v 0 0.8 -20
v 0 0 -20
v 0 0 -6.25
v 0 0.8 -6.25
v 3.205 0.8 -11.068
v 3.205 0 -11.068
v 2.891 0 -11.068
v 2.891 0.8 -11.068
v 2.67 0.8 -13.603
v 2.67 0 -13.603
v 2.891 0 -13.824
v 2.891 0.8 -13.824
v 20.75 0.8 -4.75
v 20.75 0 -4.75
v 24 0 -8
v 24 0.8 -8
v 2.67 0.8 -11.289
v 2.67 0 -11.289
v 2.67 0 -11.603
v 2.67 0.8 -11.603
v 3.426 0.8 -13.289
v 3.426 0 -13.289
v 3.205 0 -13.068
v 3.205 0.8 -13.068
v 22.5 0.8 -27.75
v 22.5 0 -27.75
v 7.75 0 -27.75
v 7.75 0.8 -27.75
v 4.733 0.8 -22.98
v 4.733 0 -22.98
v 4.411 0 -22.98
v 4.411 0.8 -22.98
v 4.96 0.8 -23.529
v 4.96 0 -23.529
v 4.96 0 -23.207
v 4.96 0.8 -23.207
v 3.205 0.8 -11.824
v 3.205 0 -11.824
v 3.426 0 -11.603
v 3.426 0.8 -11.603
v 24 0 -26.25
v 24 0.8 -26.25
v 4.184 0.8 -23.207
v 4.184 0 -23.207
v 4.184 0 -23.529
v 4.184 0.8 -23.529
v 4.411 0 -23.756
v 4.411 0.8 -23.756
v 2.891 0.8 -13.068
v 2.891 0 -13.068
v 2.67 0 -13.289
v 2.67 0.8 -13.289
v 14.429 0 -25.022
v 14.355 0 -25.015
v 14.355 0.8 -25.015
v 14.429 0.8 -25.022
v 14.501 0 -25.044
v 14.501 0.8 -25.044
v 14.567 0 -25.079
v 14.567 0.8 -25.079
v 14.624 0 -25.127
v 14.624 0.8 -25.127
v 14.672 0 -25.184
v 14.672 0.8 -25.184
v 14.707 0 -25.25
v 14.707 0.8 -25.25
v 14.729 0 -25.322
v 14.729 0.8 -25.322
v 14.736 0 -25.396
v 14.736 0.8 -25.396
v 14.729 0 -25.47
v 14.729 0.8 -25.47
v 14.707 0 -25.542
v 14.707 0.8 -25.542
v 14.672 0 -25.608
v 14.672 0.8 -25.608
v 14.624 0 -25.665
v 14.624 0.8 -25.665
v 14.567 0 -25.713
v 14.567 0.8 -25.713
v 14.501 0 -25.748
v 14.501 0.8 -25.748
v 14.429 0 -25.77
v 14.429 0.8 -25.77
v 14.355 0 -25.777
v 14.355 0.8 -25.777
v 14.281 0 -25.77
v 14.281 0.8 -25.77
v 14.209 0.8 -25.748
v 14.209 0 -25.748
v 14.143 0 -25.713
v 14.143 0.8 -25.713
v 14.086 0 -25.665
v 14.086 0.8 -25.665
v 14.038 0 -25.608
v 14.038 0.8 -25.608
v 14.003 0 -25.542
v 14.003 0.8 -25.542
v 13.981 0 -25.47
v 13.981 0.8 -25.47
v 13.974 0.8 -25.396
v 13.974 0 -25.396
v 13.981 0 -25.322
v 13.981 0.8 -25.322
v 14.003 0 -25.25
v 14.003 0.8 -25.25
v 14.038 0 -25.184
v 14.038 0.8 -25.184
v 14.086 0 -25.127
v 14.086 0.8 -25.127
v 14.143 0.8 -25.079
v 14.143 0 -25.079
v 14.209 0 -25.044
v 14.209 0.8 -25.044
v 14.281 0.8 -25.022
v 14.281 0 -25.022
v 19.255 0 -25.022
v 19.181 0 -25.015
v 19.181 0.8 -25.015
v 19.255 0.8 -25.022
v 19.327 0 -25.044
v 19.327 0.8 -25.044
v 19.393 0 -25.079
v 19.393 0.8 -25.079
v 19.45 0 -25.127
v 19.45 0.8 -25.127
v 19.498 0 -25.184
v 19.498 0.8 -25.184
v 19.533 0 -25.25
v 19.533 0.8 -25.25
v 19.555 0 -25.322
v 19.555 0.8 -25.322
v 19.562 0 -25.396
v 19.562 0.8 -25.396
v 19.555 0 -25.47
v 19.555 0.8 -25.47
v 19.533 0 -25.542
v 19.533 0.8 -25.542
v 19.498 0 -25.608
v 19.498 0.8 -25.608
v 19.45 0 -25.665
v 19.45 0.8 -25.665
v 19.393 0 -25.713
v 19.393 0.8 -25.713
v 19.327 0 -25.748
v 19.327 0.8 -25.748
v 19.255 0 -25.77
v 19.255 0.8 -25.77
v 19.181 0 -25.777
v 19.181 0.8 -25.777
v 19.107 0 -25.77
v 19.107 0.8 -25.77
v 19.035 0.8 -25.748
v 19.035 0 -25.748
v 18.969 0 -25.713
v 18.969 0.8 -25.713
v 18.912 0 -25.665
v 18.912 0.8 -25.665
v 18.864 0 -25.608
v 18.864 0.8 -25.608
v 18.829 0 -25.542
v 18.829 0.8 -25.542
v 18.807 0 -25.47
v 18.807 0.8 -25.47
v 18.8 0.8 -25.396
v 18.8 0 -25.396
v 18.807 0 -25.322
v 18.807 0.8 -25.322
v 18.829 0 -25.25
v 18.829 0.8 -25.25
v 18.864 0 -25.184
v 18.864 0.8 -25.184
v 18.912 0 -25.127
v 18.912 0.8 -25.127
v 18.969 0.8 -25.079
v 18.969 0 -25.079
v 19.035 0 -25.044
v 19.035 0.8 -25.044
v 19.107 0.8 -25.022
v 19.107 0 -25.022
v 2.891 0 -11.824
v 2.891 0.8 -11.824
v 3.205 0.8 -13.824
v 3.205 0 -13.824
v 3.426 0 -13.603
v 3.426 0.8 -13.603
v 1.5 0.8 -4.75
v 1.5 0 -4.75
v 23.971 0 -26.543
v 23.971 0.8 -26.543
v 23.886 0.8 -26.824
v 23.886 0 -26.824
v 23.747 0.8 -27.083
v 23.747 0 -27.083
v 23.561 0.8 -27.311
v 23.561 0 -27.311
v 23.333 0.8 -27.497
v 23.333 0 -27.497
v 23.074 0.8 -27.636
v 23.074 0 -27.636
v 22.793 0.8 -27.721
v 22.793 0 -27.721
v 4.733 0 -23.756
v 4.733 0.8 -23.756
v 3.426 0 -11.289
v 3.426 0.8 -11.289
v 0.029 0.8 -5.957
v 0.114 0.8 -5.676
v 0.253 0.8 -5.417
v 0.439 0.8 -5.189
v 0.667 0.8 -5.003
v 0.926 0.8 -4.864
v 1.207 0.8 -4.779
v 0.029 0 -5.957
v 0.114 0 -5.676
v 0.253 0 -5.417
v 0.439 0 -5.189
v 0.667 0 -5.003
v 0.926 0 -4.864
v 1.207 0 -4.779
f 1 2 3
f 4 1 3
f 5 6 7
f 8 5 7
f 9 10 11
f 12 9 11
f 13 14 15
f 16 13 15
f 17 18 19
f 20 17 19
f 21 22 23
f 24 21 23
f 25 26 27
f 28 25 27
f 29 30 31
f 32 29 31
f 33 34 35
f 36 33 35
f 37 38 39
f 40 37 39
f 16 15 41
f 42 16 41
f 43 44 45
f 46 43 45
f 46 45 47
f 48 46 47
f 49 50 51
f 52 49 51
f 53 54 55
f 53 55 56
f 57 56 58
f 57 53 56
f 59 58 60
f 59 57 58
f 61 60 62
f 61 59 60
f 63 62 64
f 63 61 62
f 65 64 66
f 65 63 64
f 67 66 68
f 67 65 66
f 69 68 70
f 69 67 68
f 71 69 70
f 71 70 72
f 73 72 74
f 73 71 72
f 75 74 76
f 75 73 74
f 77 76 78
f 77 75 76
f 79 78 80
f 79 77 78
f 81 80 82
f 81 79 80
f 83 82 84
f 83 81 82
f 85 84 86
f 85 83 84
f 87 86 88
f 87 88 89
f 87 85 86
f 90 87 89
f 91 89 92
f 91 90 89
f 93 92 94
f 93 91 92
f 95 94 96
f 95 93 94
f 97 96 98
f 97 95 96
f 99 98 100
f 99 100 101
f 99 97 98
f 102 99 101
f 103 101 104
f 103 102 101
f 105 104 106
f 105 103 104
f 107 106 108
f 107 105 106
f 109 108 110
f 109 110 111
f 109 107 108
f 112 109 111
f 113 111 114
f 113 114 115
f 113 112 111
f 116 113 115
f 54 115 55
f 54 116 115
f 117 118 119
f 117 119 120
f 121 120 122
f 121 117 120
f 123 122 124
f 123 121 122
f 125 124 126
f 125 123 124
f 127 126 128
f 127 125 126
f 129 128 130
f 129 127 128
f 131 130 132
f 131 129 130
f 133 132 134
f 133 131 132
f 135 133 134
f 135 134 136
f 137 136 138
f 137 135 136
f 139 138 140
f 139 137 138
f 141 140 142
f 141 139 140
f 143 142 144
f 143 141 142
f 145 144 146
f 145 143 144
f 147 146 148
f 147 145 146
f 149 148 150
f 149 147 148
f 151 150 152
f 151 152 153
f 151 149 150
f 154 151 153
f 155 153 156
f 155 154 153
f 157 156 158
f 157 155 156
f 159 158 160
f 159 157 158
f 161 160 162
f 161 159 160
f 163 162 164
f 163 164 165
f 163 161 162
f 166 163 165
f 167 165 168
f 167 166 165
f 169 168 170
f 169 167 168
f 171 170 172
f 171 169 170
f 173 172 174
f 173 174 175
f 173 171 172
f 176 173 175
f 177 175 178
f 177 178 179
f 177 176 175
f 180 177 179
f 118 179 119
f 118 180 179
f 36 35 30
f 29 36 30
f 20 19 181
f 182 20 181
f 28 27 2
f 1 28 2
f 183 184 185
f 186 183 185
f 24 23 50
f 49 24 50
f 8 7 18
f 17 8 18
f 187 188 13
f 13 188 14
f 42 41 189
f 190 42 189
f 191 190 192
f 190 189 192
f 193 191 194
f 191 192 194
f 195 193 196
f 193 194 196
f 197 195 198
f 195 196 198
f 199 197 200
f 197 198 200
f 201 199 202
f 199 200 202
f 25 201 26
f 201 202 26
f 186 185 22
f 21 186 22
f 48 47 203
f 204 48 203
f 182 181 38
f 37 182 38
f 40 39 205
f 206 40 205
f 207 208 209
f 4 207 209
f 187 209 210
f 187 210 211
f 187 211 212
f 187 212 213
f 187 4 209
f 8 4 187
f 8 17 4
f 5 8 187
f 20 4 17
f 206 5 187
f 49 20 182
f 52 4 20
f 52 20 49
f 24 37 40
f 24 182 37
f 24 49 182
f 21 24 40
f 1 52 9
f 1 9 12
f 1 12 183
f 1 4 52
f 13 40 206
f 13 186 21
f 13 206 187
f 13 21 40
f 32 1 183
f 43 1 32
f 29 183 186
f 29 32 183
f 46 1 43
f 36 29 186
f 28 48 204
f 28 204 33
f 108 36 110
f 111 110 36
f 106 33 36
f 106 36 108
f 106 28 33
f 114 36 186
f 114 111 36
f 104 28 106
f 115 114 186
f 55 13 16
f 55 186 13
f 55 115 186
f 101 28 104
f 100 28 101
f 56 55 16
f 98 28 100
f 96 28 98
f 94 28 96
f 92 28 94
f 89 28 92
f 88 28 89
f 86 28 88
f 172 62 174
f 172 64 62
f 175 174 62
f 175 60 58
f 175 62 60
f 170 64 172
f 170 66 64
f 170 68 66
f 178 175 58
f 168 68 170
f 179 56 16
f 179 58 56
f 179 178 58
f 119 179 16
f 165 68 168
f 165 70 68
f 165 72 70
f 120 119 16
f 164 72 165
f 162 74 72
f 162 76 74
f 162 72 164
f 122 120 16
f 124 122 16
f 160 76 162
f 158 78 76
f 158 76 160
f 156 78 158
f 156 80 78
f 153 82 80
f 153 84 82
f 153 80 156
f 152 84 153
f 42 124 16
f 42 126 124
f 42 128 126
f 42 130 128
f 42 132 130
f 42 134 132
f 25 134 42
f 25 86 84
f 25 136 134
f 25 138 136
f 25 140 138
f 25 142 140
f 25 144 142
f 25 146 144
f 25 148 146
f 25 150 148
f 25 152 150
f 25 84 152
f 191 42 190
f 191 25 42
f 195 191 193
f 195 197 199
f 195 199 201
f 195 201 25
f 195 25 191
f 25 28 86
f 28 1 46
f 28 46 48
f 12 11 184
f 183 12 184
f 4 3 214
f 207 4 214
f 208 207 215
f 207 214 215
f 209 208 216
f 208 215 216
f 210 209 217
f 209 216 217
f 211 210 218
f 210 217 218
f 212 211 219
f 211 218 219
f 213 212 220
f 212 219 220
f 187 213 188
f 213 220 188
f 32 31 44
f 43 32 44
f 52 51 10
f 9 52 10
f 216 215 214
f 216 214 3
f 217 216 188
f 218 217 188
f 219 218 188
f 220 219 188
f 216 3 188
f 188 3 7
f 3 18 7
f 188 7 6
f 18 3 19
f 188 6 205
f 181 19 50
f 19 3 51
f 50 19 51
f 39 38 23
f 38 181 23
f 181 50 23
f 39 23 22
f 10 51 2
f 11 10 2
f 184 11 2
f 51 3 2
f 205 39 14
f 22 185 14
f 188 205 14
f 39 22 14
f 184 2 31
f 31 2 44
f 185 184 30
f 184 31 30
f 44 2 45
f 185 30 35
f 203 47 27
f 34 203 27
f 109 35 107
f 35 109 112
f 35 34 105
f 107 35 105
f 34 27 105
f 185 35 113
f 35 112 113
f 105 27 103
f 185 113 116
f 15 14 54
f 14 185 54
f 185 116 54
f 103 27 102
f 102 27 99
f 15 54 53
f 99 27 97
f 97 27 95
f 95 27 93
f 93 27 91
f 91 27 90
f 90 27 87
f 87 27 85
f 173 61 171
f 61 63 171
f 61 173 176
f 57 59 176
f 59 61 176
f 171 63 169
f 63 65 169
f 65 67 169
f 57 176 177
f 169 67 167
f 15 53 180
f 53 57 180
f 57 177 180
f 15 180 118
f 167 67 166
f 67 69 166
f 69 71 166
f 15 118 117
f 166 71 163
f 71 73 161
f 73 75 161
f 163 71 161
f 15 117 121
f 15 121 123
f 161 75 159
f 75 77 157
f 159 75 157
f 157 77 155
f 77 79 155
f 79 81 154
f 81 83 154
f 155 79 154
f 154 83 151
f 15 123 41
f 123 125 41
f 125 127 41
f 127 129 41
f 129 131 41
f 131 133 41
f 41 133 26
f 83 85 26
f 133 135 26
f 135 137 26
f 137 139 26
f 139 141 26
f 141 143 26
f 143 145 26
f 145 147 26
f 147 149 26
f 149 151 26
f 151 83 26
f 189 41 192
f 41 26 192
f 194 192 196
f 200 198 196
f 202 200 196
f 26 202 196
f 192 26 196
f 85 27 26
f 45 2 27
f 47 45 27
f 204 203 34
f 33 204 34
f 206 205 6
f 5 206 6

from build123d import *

# Parameters (mm, degrees)
SKETCH2_R           = 0.381
BOSS_EXTRUDE1_DEPTH = 0.8


with BuildPart() as part:
    # Sketch2 → Boss-Extrude1 (new body)
    with BuildSketch(Plane(origin=(0, 0, 0), x_dir=(1, 0, 0), z_dir=(0, 1, 0))):
        with BuildLine():
            Line((7.75, 27.75), (0, 20))
            Line((0, 20), (0, 6.25))
            ThreePointArc((0, 6.25), (0.439339828, 5.189339828), (1.5, 4.75))
            Line((1.5, 4.75), (20.75, 4.75))
            Line((20.75, 4.75), (24, 8))
            Line((24, 8), (24, 26.25))
            ThreePointArc((24, 26.25), (23.560660172, 27.310660172), (22.5, 27.75))
            Line((22.5, 27.75), (7.75, 27.75))
        make_face()
        Polygon((3.4258, 11.28943968), (3.20456032, 11.0682), (2.89143968, 11.0682), (2.6702, 11.28943968), (2.6702, 11.60256032), (2.89143968, 11.8238), (3.20456032, 11.8238), (3.4258, 11.60256032), align=None, mode=Mode.SUBTRACT)
        Polygon((3.4258, 13.28943968), (3.20456032, 13.0682), (2.89143968, 13.0682), (2.6702, 13.28943968), (2.6702, 13.60256032), (2.89143968, 13.8238), (3.20456032, 13.8238), (3.4258, 13.60256032), align=None, mode=Mode.SUBTRACT)
        Polygon((4.41108848, 22.9797), (4.1837, 23.20708848), (4.1837, 23.52891152), (4.41108848, 23.7563), (4.73291152, 23.7563), (4.9603, 23.52891152), (4.9603, 23.20708848), (4.73291152, 22.9797), align=None, mode=Mode.SUBTRACT)
        with Locations((14.355, 25.396)):
            Circle(SKETCH2_R, mode=Mode.SUBTRACT)
        with Locations((19.181, 25.396)):
            Circle(SKETCH2_R, mode=Mode.SUBTRACT)
    extrude(amount=BOSS_EXTRUDE1_DEPTH)


solid = part.part
